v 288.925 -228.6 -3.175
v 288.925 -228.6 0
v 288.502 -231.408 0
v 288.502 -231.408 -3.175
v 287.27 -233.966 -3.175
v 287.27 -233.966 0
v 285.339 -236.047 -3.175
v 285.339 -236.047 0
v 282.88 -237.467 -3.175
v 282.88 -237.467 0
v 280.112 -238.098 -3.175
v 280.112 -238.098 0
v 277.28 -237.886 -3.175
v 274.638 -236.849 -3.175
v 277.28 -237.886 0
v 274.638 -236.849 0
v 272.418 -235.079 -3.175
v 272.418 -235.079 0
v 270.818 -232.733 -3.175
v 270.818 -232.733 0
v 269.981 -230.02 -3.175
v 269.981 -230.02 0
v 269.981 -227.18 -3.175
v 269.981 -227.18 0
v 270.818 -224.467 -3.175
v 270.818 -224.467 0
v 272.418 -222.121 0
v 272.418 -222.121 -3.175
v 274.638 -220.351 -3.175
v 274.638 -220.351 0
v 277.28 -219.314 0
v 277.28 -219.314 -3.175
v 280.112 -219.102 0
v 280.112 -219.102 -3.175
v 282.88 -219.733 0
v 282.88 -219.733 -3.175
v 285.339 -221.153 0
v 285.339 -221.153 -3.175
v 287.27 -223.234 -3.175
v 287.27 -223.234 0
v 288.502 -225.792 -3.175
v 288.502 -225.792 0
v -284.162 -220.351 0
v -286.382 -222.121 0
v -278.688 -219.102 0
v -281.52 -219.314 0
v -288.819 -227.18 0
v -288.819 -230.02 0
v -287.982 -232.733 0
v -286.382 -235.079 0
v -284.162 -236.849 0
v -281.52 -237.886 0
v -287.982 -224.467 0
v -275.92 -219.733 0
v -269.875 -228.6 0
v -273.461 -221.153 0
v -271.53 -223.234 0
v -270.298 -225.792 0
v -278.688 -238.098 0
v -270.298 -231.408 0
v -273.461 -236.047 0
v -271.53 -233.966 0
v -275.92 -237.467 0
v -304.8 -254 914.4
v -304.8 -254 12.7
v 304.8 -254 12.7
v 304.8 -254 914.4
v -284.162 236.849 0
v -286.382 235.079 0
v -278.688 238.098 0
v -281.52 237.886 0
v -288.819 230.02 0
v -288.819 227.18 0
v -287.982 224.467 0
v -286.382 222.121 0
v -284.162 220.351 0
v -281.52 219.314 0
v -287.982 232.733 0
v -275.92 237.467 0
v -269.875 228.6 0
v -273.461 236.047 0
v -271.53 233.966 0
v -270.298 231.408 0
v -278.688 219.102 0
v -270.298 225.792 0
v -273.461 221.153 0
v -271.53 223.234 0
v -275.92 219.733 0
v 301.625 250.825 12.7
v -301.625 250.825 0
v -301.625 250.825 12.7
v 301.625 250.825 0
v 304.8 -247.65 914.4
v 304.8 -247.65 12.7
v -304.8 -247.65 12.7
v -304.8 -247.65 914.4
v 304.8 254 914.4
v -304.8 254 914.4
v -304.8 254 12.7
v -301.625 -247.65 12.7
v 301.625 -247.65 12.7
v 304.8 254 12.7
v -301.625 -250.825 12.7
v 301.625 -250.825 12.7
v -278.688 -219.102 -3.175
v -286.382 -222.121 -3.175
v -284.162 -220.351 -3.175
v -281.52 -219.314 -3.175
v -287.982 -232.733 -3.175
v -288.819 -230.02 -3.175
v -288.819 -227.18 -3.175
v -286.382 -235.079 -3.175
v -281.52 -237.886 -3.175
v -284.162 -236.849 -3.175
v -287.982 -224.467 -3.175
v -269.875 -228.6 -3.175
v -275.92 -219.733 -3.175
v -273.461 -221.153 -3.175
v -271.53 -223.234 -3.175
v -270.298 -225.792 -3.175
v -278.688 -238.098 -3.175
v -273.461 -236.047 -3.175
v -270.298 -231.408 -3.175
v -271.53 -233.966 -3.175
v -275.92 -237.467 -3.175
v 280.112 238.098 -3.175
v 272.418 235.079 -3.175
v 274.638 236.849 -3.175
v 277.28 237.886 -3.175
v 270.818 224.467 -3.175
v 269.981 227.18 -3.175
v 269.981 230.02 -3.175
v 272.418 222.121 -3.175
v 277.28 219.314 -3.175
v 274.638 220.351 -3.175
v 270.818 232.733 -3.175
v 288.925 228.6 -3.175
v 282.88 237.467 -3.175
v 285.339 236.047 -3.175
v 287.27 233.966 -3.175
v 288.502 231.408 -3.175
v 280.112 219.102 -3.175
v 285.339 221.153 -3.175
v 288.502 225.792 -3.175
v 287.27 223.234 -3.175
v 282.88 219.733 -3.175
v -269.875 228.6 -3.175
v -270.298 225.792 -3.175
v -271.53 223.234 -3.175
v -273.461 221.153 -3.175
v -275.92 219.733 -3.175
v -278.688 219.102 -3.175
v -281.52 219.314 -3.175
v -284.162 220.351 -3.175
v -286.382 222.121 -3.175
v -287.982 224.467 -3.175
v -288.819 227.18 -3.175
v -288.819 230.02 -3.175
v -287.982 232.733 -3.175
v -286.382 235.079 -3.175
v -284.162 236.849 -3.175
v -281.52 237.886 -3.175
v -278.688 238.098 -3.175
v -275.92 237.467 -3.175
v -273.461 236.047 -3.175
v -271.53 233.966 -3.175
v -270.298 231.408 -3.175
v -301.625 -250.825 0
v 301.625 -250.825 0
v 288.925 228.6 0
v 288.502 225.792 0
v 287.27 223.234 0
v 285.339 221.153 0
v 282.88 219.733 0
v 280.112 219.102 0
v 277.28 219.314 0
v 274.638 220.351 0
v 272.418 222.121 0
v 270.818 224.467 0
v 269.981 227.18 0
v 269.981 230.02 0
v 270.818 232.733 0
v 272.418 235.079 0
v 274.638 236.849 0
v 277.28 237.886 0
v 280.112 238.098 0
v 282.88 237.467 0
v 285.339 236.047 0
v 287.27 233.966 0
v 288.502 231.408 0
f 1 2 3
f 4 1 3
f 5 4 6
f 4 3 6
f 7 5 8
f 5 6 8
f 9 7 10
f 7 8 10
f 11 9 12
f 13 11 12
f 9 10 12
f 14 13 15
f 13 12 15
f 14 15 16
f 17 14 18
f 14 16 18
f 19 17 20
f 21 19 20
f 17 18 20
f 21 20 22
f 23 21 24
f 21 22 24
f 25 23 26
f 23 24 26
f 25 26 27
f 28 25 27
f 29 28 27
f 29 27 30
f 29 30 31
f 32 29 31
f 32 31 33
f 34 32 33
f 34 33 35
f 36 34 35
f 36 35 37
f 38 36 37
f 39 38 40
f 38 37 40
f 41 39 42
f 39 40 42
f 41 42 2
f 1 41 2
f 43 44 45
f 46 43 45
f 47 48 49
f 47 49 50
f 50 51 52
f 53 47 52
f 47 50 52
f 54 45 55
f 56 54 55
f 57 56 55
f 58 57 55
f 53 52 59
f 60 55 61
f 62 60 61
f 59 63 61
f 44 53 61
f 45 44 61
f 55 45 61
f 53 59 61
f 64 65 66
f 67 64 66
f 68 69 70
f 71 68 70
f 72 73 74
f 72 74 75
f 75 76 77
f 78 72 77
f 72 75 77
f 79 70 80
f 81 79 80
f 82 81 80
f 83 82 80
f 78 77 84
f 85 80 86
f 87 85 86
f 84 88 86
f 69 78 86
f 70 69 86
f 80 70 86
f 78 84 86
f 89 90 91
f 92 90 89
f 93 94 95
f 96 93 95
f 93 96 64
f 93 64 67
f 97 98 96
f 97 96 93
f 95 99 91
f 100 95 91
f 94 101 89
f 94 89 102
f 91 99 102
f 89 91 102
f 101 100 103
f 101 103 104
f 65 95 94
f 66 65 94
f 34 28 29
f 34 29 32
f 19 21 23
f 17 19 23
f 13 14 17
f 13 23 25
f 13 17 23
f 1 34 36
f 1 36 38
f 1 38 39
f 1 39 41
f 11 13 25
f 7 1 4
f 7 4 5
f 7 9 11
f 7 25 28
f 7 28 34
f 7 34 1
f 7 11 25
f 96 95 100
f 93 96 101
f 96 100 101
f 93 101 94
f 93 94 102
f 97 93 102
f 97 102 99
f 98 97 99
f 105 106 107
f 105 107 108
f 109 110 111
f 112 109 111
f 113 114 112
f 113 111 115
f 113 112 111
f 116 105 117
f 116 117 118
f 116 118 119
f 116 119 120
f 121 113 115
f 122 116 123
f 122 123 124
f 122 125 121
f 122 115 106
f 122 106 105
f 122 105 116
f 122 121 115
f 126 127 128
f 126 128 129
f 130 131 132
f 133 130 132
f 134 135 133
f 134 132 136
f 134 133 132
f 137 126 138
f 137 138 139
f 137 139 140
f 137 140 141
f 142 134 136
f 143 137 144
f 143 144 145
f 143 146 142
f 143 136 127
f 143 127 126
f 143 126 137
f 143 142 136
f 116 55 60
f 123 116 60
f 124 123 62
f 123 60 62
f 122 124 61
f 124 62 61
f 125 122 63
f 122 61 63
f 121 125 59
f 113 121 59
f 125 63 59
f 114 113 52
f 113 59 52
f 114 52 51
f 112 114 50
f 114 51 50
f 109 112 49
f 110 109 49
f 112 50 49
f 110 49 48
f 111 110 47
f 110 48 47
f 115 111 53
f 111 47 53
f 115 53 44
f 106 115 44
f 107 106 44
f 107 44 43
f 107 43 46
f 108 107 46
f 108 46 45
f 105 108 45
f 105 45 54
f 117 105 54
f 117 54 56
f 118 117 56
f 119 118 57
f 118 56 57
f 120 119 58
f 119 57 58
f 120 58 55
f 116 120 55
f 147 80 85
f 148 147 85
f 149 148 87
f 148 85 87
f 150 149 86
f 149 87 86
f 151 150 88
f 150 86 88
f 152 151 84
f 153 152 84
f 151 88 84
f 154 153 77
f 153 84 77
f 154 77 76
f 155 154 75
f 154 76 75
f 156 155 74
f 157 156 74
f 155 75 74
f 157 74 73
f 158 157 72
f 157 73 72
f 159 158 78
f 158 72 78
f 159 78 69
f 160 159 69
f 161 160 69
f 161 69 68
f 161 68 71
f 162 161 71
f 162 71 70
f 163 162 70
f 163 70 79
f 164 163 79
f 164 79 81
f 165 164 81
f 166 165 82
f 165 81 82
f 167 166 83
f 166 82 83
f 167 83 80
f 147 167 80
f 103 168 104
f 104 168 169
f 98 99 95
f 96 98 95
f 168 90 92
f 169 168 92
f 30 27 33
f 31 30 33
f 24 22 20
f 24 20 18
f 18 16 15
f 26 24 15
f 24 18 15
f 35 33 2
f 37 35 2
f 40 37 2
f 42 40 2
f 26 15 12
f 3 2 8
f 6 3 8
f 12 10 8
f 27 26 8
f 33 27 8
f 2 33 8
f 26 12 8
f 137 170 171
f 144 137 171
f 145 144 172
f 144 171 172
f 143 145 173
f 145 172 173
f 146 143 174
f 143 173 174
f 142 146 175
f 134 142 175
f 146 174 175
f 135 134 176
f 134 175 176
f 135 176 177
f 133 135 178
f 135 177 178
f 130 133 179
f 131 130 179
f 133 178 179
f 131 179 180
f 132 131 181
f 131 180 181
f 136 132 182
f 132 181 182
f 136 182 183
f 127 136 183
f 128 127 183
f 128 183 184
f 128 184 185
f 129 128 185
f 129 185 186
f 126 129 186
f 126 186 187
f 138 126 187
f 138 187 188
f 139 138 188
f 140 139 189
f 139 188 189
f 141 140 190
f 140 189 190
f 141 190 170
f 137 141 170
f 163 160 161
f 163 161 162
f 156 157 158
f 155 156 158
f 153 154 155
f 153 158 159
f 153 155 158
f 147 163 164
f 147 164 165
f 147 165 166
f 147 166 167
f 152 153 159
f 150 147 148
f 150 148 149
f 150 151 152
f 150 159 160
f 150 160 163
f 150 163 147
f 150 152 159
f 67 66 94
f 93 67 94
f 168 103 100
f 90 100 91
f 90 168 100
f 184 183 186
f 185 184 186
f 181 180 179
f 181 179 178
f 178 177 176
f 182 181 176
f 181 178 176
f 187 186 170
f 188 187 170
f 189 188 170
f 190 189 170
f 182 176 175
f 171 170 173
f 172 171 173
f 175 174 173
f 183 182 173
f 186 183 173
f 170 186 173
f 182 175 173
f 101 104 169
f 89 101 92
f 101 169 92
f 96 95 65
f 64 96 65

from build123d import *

# Parameters (mm, degrees)
F0_W     = 603.25
F0_H     = 501.65
F1_DEPTH = 12.7
F2_W     = 603.25
F2_H     = 498.475
F3_DEPTH = 901.7
F2_H_2   = 3.175
F4_DEPTH = 901.7
F5_R     = 9.525
F6_DEPTH = 3.175


with BuildPart() as f1:
    # F0 (on Top) → F1 (new body)
    with BuildSketch(Plane.XY):
        Rectangle(F0_W, F0_H)
    extrude(amount=F1_DEPTH)

    # F2 (on face) → F3 (join)
    with BuildSketch(Plane.XY.offset(12.7)):
        with Locations((0, 1.5875)):
            Rectangle(F2_W, F2_H)
        Polygon((304.8, 254), (-304.8, 254), (-304.8, -247.65), (-301.625, -247.65), (-301.625, 250.825), (301.625, 250.825), (301.625, -247.65), (304.8, -247.65), align=None)
    extrude(amount=F3_DEPTH)


with BuildPart() as f4:
    # F2 (on face) → F4 (new body)
    with BuildSketch(Plane.XY.offset(12.7)):
        with Locations((0, -249.2375)):
            Rectangle(F2_W, F2_H_2)
        Polygon((-301.625, -247.65), (-304.8, -247.65), (-304.8, -254), (304.8, -254), (304.8, -247.65), (301.625, -247.65), (301.625, -250.825), (-301.625, -250.825), align=None)
    extrude(amount=F4_DEPTH)


with BuildPart() as f6:
    # F5 (on face) → F6 (new body)
    with BuildSketch(Plane(origin=(0, 0, 0), x_dir=(1, 0, 0), z_dir=(0, 0, -1))):
        with Locations((-279.4, 228.6)):
            Circle(F5_R)
    extrude(amount=F6_DEPTH)


with BuildPart() as f6b:
    # F5 (on face) → F6, piece 2 (new body)
    with BuildSketch(Plane(origin=(0, 0, 0), x_dir=(1, 0, 0), z_dir=(0, 0, -1))):
        with Locations((-279.4, -228.6)):
            Circle(F5_R)
    extrude(amount=F6_DEPTH)


with BuildPart() as f6c:
    # F5 (on face) → F6, piece 3 (new body)
    with BuildSketch(Plane(origin=(0, 0, 0), x_dir=(1, 0, 0), z_dir=(0, 0, -1))):
        with Locations((279.4, 228.6)):
            Circle(F5_R)
    extrude(amount=F6_DEPTH)


with BuildPart() as f6d:
    # F5 (on face) → F6, piece 4 (new body)
    with BuildSketch(Plane(origin=(0, 0, 0), x_dir=(1, 0, 0), z_dir=(0, 0, -1))):
        with Locations((279.4, -228.6)):
            Circle(F5_R)
    extrude(amount=F6_DEPTH)


solid = Compound([f1.part, f4.part, f6.part, f6b.part, f6c.part, f6d.part])
